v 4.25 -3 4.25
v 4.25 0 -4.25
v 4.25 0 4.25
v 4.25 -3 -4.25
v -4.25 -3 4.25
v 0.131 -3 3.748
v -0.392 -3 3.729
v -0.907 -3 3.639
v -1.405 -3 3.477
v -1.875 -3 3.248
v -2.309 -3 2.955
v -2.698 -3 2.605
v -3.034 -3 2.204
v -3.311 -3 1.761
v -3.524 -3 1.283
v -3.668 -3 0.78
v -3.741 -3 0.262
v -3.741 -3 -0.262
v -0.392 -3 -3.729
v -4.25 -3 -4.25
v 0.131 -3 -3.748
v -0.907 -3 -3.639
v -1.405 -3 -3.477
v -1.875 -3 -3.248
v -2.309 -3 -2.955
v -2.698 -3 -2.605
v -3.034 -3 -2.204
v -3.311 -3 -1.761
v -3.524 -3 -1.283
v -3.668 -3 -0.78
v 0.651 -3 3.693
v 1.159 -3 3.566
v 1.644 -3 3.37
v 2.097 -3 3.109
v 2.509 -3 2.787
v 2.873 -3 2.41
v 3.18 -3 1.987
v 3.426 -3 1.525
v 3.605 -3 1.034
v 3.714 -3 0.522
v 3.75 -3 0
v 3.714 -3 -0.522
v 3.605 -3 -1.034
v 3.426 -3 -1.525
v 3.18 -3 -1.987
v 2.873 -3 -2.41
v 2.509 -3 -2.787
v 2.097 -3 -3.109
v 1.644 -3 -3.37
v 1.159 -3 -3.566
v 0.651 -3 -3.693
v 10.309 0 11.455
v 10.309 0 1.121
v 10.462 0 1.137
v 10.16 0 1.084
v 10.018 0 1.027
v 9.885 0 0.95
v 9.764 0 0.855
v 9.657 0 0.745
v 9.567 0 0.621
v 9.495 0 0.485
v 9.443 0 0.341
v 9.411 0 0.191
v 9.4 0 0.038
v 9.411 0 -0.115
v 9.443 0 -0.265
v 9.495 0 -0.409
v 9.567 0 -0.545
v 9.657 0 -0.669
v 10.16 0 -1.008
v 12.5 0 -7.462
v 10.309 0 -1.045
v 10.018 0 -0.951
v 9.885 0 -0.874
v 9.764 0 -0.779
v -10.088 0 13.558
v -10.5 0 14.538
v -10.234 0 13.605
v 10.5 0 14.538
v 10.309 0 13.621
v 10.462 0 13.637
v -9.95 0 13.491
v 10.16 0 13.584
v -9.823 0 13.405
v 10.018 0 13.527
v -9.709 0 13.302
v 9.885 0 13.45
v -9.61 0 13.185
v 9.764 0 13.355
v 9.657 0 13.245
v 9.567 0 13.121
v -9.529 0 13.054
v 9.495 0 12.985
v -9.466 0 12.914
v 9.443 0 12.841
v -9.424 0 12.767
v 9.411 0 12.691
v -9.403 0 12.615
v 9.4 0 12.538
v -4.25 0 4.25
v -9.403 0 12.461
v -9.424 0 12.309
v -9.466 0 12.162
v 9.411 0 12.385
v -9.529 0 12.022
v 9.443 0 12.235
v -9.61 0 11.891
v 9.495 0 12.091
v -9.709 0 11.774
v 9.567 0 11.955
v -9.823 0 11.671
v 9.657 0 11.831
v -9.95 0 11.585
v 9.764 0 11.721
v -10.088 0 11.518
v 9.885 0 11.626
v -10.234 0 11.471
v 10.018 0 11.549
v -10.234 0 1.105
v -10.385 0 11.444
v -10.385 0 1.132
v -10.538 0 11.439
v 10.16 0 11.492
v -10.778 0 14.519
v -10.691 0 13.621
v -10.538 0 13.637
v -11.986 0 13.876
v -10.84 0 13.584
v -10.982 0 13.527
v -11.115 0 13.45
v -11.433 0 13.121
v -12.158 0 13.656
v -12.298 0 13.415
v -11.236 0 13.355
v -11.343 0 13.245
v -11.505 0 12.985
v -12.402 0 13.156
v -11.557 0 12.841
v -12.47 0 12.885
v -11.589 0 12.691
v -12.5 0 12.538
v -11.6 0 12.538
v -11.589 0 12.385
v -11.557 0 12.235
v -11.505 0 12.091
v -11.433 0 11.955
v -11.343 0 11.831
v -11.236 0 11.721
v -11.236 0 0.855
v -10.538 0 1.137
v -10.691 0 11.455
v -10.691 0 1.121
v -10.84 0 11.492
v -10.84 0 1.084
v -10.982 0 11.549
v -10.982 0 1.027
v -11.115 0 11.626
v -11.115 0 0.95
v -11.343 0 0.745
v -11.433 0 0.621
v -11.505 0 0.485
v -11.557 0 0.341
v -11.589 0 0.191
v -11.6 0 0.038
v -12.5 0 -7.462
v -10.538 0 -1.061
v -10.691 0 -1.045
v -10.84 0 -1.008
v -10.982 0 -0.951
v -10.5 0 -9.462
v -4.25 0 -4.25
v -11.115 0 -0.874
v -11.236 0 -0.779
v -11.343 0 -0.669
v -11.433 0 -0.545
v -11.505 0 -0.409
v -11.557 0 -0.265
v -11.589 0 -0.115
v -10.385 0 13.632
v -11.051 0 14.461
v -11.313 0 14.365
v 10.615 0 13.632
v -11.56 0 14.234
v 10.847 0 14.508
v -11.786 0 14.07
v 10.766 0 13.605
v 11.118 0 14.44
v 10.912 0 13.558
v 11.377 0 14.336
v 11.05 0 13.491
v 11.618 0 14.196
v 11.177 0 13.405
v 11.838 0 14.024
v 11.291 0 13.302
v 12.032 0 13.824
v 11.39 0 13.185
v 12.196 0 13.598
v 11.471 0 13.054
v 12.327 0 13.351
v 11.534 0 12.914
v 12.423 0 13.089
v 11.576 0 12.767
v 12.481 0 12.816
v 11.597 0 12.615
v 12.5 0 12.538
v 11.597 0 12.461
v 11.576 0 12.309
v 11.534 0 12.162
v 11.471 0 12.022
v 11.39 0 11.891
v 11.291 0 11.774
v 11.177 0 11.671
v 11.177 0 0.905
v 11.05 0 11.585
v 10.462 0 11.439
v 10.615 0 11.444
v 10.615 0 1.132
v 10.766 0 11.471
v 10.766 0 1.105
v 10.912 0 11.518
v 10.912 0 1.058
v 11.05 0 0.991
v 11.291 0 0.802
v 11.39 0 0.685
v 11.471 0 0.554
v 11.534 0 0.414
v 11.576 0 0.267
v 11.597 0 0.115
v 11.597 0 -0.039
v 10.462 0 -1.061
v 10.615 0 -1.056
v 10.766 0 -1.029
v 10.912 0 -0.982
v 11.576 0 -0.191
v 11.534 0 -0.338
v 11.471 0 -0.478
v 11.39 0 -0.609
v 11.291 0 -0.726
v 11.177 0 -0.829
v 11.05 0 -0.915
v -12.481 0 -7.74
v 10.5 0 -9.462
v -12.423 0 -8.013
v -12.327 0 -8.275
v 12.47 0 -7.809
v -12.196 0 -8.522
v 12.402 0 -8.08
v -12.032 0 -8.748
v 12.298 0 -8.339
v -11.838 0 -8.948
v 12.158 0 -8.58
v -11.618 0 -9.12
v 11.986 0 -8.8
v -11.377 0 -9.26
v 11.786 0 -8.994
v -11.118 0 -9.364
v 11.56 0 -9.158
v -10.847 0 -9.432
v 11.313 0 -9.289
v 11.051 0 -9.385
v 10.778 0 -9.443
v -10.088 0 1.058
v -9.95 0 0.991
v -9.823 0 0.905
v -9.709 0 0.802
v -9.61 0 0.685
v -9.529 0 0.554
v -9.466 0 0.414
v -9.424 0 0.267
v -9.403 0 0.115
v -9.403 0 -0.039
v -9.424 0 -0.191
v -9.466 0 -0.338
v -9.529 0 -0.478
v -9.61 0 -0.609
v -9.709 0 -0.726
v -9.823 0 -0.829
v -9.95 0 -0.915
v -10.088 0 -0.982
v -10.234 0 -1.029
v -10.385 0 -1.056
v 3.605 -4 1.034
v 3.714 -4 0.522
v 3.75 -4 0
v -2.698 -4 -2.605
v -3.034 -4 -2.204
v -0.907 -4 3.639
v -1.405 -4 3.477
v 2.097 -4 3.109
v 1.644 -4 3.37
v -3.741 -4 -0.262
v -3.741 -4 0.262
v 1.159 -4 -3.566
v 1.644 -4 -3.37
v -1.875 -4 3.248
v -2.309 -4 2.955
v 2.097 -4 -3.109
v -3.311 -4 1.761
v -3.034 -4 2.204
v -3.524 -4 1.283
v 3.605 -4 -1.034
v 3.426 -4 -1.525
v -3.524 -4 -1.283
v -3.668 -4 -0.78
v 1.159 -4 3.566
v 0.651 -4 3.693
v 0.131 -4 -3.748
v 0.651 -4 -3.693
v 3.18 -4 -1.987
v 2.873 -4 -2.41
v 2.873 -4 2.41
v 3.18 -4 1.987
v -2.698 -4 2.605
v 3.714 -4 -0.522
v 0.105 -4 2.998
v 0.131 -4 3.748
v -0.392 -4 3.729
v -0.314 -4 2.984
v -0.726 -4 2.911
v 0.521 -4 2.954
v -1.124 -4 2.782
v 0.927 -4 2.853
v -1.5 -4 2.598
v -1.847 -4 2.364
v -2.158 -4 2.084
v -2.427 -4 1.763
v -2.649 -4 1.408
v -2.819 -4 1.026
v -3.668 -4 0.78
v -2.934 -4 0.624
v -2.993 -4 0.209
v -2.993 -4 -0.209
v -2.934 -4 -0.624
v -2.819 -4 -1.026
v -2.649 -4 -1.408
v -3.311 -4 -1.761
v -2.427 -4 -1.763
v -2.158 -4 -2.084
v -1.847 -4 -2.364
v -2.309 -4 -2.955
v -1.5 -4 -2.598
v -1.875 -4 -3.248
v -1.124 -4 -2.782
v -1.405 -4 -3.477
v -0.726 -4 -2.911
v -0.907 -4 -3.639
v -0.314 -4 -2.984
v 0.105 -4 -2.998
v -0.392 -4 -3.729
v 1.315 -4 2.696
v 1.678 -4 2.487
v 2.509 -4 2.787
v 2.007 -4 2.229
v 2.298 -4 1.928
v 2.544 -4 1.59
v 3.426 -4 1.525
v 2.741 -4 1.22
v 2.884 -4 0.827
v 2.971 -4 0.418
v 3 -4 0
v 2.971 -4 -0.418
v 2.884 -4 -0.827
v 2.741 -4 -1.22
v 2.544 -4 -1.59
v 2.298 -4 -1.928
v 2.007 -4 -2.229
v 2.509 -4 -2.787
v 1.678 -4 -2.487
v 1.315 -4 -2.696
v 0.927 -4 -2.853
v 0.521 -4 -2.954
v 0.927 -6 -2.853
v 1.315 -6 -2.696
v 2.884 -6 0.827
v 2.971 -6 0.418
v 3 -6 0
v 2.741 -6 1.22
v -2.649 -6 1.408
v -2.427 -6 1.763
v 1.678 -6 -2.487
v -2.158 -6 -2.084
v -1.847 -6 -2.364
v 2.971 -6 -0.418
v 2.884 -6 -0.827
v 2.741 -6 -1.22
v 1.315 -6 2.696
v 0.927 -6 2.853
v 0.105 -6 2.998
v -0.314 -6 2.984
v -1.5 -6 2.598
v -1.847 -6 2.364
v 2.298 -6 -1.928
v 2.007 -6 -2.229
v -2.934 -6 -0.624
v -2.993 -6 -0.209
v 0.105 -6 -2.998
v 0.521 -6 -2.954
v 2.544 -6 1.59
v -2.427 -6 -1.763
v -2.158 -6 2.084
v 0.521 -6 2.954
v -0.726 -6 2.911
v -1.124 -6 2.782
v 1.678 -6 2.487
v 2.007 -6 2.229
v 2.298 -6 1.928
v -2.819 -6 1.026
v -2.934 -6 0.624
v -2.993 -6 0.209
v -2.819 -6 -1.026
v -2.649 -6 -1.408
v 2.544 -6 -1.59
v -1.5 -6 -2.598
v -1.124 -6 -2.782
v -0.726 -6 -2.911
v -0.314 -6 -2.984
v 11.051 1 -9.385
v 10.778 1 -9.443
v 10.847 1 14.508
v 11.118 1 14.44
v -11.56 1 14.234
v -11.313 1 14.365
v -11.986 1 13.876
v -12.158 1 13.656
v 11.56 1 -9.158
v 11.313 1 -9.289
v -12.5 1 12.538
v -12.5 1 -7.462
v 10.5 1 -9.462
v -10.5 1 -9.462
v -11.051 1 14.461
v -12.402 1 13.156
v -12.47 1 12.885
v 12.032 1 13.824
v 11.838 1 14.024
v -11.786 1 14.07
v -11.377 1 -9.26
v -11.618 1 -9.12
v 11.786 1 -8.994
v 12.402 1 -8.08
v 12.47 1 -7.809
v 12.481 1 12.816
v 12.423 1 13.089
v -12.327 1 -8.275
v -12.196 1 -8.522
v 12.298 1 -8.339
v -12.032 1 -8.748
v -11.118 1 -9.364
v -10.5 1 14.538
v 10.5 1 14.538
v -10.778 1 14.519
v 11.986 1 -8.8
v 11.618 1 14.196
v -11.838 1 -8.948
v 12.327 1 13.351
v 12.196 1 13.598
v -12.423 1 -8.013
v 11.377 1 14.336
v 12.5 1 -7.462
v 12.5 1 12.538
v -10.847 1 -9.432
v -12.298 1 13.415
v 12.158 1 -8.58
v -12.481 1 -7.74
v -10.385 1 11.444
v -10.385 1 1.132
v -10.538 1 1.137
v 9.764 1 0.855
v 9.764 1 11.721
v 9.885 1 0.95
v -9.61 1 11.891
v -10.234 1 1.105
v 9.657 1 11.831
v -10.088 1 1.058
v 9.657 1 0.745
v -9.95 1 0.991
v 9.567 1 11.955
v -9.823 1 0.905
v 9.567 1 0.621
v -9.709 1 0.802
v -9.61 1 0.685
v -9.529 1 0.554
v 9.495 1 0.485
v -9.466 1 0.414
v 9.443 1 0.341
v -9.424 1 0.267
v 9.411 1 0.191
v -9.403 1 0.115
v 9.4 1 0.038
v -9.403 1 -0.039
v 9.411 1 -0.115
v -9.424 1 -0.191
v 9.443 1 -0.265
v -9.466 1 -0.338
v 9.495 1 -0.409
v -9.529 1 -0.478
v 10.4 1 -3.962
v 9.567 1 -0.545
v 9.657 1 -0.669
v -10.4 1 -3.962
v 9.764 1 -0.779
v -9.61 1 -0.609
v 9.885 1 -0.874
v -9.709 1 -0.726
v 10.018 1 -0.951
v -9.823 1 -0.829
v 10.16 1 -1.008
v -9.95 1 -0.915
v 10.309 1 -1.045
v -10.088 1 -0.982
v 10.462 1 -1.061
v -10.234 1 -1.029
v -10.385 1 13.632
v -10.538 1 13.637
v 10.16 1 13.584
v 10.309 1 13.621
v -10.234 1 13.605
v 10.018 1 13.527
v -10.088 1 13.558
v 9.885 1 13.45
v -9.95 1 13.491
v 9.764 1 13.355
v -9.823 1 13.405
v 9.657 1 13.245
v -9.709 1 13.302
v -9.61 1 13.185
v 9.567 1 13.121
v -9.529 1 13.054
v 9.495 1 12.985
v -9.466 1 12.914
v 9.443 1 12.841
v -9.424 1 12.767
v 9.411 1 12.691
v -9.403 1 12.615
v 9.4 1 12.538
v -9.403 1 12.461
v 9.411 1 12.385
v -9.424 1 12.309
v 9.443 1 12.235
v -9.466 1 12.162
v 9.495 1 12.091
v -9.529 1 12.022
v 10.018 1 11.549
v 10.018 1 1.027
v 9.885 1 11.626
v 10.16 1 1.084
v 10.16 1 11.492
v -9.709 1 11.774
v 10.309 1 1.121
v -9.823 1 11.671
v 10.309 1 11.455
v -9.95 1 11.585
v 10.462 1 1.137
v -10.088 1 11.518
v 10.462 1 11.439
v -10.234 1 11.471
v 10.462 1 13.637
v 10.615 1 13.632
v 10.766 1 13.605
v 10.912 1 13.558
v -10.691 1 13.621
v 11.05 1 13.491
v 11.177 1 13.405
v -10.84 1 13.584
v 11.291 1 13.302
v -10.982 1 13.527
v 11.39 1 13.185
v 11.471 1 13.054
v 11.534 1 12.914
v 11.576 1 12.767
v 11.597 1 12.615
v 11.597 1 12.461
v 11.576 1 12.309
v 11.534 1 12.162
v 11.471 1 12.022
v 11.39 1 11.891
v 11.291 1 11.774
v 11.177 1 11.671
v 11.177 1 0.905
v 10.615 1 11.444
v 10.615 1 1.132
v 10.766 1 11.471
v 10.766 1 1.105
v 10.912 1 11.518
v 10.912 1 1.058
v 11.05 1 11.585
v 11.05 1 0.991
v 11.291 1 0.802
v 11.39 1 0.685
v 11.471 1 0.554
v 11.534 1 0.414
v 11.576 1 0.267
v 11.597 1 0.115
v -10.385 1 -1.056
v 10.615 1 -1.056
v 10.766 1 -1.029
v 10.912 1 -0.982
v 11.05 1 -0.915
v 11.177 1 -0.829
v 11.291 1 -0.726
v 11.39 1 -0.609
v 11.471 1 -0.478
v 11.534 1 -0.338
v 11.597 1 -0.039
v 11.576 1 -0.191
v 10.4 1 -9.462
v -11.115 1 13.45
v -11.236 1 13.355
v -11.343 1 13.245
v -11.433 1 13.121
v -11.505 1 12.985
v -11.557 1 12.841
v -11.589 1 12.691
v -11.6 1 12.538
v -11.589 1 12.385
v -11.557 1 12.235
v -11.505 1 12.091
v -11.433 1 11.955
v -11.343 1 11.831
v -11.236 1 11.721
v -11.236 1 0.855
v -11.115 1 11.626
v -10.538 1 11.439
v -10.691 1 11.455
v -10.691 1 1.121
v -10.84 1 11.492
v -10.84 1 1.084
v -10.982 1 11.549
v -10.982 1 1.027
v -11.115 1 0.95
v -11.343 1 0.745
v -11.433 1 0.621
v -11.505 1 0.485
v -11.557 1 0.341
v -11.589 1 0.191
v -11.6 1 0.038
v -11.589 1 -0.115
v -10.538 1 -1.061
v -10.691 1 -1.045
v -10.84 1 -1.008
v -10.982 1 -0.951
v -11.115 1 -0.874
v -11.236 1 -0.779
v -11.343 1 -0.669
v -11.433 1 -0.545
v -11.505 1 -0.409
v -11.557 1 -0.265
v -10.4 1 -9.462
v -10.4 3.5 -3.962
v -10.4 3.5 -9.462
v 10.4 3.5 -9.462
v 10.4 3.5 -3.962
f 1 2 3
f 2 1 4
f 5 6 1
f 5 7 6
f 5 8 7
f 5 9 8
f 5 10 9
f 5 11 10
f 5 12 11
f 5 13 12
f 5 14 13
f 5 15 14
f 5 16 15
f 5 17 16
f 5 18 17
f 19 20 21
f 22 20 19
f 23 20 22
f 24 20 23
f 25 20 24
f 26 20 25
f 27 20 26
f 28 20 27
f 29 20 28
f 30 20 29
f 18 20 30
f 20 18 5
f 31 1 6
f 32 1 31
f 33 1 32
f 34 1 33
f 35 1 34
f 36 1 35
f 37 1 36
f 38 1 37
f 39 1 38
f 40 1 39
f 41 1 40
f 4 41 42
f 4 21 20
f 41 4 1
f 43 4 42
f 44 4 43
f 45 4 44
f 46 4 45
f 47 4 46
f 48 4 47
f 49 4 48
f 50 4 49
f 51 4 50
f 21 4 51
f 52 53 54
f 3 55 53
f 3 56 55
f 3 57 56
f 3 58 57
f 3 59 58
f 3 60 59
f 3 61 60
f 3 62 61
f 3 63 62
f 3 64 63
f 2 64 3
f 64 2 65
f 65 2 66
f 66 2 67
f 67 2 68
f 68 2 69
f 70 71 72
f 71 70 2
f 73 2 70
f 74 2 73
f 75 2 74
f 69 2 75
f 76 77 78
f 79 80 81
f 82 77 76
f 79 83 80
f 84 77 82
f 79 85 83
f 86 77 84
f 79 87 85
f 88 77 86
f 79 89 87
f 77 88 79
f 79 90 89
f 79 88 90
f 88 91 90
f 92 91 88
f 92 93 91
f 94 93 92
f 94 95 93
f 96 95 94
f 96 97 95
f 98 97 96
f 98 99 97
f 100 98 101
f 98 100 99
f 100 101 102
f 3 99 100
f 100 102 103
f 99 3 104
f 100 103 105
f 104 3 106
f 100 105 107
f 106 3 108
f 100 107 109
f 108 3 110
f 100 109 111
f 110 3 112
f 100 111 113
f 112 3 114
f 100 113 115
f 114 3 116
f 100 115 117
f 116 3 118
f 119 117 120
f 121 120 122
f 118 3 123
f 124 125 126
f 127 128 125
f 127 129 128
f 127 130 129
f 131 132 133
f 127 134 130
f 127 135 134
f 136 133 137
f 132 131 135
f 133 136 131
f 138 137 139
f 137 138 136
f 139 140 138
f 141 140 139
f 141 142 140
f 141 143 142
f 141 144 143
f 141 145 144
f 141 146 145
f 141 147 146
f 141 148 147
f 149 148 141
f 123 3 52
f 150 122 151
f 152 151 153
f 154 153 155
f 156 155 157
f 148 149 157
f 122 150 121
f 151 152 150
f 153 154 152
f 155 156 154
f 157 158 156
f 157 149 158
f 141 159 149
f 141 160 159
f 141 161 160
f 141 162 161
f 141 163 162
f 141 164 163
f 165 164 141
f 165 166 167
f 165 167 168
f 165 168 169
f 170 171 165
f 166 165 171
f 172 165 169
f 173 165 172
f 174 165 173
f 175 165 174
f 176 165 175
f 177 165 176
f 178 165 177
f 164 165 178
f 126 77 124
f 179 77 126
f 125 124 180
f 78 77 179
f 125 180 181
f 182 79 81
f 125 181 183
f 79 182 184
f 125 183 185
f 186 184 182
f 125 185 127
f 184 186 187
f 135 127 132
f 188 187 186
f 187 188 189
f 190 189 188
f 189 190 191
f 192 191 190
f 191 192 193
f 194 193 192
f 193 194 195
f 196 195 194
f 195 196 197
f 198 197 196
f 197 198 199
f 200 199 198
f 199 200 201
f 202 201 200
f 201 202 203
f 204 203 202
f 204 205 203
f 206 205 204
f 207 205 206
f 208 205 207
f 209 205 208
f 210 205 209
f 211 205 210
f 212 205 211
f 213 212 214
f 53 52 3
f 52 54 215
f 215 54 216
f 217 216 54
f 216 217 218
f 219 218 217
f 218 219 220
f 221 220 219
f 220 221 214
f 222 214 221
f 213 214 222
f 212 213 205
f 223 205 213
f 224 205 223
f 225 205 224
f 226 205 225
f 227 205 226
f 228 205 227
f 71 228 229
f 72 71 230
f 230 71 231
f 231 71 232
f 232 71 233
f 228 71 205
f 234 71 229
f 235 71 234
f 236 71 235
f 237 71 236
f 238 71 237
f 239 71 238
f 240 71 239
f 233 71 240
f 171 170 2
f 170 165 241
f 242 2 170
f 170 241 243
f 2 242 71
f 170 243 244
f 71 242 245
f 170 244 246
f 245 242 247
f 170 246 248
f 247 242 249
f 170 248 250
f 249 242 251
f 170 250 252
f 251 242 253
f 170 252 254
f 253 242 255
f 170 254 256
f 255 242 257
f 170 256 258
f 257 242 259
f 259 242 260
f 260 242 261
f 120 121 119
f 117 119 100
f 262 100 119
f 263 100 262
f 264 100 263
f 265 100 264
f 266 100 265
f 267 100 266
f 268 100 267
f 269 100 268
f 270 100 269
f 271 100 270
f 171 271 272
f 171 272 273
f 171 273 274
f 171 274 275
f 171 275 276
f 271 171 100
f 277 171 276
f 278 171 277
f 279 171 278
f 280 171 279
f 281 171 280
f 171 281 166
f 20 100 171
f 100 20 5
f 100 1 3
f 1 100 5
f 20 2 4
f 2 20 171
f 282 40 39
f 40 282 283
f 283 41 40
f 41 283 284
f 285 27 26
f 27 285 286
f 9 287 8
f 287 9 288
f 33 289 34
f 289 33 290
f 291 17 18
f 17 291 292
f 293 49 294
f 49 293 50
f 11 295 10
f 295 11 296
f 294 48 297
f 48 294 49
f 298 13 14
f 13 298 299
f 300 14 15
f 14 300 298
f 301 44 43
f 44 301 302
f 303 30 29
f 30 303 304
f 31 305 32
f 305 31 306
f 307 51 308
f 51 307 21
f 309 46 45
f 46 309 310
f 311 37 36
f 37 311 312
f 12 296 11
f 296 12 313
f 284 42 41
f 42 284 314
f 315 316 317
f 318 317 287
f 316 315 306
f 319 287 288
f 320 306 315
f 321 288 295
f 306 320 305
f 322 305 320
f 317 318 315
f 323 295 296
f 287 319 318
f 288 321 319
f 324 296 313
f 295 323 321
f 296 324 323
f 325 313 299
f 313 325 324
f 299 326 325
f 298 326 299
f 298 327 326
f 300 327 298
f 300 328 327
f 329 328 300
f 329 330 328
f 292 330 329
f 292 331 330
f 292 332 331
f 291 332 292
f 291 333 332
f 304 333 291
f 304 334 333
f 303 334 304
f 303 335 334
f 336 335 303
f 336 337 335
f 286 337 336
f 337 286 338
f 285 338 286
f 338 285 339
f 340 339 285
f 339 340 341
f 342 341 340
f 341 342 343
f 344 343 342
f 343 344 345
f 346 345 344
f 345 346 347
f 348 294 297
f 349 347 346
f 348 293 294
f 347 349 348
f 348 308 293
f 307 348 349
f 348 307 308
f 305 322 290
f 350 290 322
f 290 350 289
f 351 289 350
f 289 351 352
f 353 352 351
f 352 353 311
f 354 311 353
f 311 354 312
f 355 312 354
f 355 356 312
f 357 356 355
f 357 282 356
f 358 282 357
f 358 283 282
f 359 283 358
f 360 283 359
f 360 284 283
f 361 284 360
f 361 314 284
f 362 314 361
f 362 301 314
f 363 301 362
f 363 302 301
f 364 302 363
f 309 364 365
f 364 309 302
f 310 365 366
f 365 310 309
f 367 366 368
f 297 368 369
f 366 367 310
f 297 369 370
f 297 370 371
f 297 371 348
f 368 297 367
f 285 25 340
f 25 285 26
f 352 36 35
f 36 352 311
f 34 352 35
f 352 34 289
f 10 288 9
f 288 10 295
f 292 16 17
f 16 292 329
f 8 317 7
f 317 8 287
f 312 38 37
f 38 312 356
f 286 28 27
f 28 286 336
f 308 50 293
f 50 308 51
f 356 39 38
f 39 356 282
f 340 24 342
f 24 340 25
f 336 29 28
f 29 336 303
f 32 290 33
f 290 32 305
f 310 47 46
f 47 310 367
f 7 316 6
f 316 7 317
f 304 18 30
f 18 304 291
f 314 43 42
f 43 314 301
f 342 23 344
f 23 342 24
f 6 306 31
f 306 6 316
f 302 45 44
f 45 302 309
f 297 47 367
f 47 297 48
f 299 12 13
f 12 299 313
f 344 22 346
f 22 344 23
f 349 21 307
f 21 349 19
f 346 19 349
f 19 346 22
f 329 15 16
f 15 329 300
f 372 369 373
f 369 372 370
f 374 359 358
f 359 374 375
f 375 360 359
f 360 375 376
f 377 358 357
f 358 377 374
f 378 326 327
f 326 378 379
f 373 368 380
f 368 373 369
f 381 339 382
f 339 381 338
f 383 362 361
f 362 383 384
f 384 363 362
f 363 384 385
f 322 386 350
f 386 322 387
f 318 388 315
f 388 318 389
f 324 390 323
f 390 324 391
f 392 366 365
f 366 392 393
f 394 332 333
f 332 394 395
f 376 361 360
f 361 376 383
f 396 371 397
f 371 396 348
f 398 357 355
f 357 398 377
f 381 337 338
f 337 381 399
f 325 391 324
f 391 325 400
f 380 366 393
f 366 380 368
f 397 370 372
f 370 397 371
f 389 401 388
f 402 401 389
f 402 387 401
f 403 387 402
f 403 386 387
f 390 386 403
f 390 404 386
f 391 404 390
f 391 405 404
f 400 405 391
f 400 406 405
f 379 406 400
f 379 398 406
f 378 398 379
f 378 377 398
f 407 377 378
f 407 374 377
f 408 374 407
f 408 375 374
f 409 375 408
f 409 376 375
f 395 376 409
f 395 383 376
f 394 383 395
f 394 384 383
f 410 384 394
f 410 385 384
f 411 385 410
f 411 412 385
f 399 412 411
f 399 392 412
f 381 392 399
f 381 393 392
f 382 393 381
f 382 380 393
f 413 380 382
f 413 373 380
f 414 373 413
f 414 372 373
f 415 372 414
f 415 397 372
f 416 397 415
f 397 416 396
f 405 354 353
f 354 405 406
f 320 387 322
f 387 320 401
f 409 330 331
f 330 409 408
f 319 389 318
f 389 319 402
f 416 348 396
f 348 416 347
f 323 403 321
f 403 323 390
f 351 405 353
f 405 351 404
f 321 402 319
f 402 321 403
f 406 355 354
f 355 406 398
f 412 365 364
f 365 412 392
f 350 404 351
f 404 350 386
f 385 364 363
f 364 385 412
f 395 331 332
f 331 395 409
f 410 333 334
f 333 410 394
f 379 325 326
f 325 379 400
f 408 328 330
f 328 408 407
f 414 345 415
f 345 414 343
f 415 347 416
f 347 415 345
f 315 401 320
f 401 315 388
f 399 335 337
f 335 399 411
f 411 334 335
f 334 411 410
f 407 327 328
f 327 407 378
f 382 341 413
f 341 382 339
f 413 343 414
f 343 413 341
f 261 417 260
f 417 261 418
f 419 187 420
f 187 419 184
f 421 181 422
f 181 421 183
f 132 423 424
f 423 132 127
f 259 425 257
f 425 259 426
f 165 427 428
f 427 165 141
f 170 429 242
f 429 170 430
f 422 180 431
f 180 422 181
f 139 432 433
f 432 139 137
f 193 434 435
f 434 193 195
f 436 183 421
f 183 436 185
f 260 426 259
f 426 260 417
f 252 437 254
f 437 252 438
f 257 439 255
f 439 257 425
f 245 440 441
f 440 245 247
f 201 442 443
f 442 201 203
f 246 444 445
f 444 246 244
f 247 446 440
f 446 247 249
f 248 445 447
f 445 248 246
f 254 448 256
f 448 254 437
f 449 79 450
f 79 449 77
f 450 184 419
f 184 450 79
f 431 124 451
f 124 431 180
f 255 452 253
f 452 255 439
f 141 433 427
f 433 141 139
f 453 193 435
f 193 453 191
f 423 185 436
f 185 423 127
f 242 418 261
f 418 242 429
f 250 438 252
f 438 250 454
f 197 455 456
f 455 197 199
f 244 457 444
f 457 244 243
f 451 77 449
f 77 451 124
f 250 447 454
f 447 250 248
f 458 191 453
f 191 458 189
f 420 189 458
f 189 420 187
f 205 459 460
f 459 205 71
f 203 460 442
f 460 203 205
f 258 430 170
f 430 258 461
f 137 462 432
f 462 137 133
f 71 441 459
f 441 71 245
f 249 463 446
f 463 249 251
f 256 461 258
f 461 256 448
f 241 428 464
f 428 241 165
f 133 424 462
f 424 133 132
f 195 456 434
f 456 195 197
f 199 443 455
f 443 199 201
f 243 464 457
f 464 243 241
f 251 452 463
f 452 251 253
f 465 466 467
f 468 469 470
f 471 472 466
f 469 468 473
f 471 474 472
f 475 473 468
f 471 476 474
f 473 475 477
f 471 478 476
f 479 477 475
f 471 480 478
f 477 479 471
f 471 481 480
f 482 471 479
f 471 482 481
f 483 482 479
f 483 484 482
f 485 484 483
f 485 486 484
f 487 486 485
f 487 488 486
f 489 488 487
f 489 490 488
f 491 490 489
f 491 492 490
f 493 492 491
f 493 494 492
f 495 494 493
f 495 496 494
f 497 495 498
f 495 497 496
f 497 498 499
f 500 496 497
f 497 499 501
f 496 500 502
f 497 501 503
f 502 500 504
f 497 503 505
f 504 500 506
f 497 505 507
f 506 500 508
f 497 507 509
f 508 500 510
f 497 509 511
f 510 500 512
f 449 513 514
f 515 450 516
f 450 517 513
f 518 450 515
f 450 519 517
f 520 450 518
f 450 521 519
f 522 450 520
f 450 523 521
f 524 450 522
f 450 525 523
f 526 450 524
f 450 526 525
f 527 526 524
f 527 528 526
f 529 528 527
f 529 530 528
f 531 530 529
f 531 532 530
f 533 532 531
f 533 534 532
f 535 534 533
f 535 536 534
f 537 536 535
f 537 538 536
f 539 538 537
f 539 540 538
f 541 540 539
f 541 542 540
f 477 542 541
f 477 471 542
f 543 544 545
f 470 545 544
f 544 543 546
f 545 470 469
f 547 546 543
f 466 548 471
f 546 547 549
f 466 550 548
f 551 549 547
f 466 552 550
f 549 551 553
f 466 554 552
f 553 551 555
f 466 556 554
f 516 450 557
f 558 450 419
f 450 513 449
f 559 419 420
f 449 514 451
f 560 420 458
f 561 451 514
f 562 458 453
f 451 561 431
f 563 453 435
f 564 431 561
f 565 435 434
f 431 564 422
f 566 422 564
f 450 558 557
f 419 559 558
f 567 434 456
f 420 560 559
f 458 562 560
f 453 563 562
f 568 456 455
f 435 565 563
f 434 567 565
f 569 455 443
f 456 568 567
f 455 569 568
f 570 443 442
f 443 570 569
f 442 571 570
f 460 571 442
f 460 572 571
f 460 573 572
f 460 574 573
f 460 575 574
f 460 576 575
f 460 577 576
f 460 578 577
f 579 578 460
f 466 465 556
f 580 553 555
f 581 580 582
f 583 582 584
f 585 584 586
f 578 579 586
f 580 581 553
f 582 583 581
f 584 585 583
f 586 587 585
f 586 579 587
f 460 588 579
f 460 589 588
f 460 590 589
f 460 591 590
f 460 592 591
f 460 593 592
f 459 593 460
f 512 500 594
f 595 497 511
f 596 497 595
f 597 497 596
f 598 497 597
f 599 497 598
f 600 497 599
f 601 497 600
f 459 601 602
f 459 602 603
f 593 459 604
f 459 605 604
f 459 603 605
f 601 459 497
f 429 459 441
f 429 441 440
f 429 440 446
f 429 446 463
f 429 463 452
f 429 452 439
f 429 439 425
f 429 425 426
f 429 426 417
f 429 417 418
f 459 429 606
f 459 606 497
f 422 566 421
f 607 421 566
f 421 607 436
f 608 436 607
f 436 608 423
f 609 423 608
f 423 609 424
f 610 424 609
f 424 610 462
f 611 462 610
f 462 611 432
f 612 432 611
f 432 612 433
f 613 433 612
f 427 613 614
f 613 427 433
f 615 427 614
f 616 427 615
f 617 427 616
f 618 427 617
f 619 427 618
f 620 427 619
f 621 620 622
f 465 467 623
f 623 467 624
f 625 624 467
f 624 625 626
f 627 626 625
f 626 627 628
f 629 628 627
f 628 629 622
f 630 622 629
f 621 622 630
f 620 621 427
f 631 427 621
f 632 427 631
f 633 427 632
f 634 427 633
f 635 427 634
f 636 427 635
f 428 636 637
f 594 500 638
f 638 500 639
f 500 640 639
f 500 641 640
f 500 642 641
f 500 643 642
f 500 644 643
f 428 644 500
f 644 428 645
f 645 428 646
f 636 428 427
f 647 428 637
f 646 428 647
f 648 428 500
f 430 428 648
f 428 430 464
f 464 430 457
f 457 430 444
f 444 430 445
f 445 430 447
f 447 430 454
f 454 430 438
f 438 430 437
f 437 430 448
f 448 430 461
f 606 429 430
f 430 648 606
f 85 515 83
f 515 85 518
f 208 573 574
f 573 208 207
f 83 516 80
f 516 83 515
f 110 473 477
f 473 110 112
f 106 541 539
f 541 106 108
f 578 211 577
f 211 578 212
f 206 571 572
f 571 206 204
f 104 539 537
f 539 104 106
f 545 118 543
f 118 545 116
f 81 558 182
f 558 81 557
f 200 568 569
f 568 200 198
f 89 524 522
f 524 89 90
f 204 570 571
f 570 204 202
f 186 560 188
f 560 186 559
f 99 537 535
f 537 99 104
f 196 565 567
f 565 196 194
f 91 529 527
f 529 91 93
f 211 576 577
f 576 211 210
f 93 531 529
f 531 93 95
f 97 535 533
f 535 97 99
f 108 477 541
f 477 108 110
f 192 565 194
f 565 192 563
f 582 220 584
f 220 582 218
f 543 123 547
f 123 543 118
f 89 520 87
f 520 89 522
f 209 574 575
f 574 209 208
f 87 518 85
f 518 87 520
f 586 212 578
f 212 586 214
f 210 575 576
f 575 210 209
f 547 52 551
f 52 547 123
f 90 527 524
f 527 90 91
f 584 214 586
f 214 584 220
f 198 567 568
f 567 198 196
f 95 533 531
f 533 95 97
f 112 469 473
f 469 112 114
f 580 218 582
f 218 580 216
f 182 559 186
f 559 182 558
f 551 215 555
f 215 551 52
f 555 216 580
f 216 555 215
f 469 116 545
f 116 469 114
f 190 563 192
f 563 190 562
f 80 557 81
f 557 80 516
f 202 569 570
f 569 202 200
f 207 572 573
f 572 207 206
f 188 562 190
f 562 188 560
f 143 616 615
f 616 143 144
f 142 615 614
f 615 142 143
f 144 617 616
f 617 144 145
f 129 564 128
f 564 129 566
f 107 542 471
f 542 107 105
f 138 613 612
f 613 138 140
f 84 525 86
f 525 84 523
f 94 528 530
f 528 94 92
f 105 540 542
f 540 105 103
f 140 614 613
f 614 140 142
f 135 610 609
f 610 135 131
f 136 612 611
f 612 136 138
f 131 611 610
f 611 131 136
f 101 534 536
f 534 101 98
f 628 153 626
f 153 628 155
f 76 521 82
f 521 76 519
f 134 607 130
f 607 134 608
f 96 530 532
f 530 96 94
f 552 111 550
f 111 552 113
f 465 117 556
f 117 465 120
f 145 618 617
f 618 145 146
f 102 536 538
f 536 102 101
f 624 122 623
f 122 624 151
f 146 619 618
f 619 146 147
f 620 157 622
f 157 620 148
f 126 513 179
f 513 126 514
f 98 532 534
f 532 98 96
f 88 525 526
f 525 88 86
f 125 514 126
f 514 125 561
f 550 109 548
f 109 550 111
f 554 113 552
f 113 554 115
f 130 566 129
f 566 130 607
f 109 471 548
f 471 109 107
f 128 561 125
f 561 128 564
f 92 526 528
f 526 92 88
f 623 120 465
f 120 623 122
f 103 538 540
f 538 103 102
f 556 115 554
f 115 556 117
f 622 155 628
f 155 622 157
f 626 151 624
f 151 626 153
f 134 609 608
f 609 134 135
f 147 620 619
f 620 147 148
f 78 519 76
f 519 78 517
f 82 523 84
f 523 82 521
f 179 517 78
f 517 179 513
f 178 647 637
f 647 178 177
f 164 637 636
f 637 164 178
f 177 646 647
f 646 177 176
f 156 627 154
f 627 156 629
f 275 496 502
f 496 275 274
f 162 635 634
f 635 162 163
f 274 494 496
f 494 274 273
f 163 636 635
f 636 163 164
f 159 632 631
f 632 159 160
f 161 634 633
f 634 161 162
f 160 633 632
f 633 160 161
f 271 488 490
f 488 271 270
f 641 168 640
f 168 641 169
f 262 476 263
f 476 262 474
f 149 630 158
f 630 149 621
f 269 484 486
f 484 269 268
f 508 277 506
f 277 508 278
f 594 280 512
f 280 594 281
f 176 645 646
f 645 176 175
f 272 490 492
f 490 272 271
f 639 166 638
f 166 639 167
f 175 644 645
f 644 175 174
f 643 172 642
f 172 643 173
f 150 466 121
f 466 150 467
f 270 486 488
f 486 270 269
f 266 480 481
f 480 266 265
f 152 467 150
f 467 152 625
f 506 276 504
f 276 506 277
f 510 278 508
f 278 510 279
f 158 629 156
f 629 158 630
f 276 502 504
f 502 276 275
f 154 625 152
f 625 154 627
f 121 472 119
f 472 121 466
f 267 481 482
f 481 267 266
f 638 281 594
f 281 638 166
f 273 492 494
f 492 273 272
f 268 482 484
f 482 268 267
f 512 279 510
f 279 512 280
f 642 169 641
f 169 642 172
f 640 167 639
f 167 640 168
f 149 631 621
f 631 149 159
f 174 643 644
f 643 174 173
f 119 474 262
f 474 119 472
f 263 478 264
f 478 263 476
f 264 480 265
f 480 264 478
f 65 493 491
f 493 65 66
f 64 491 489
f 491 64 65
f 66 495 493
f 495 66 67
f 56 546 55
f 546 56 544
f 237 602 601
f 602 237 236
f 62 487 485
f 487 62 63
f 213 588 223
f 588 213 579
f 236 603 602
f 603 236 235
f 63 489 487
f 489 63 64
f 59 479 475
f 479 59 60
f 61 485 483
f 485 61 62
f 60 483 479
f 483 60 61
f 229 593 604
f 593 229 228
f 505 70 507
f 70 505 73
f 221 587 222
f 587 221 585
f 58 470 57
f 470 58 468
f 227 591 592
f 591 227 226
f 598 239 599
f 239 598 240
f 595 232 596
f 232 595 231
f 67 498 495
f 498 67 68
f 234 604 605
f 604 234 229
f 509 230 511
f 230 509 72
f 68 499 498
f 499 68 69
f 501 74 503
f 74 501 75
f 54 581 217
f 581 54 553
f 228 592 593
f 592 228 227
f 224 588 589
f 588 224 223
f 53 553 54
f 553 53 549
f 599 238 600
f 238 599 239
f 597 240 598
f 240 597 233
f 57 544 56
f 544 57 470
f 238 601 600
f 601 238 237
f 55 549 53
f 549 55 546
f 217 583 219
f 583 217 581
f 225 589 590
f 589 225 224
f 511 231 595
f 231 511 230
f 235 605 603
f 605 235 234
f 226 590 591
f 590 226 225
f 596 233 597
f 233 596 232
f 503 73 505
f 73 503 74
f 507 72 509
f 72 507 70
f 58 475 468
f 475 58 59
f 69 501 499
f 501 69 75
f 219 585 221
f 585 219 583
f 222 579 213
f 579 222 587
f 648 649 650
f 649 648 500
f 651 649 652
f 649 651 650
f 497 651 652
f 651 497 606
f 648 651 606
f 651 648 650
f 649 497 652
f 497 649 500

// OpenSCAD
// file: variables.scad
// Name: Raspberry Pi Camera v2.1 Variables
// Description: Variables used by the camera model
// Created: 1 Sep 2021
// Author: Krisjanis Rijnieks

// Dimensions taken from
// https://www.raspberrypi-spy.co.uk/2013/05/pi-camera-module-mechanical-dimensions/
// https://www.raspberrypi.org/documentation/accessories/camera.html

rpiCameraPCBWidth = 25;
rpiCameraPCBHeight = 24;
rpiCameraPCBThickness = 1;
rpiCameraPCBCornerRadius = 2;

rpiCameraHoleDiameter = 2.2;
rpiCameraHolePadding = 2;
rpiCameraHoleDistance = 12.5; // Vertical distance between holes aligned with the cam and the ones on the edge

rpiCameraSensorBaseSize = 8.5;
rpiCameraSensorBaseHeight = 3;
rpiCameraSensorRingSize = 7.5;
rpiCameraSensorRingHeight = 1;
rpiCameraSensorLensSize = 6;
rpiCameraSensorLensHeight = 2; // this is split in half if we want more detail
rpiCameraSensorCenterToTopEdge = 9.462;

rpiCameraConnectorWidth = 20.8;
rpiCameraConnectorThickness = 2.5;
rpiCameraConnectorHeight = 5.5;
rpiCameraCableWidth = 16;


rpiCameraFullThickness = 9;
// main file
// Name: Raspberry Pi Camera v2.1
// Description: A model to be integrated in other models
// Created: 1 Sep 2021
// Author: Krisjanis Rijnieks

include <variables.scad>

RpiCameraSensor(
  baseSize = rpiCameraSensorBaseSize, 
  baseHeight = rpiCameraSensorBaseHeight,
  ringSize = rpiCameraSensorRingSize,
  ringHeight = rpiCameraSensorRingHeight, 
  lensSize = rpiCameraSensorLensSize,
  lensHeight = rpiCameraSensorLensHeight);

RpiCameraPCB(
  width = rpiCameraPCBWidth,
  height = rpiCameraPCBHeight,
  thickness = rpiCameraPCBThickness, 
  cornerRadius = rpiCameraPCBCornerRadius,
  holeDiameter = rpiCameraHoleDiameter,
  holePadding = rpiCameraHolePadding,
  holeDistance = rpiCameraHoleDistance,
  sensorToTopEdge = rpiCameraSensorCenterToTopEdge);

rotate([90, 180, 0])
translate([0, 
  rpiCameraSensorCenterToTopEdge, 
  -rpiCameraPCBThickness])
RpiCameraConnector(
  width = rpiCameraConnectorWidth,
  height = rpiCameraConnectorHeight,
  thickness = rpiCameraConnectorThickness);

module RpiCameraConnector(
  width, thickness, height,
  pcbThickness, ){
  mirror([0, 0, 1])
  translate([-width/2, -height, 0])
  cube(size = [width, height, thickness]);
}

module RpiCameraPCB(
  width, height, thickness, cornerRadius, 
  holeDiameter, holePadding, holeDistance,
  sensorToTopEdge){
  
  // rotate so that shorter gap beten edge and sensor is at the bottom
  rotate([90, 180, 0]){
    translate([
      -width / 2, 
      -height + sensorToTopEdge, 0])
    mirror([0, 0, 1])
    difference(){
      linear_extrude(height = thickness){
        offset(r = cornerRadius, $fn = 45){
          offset(r = -cornerRadius){
            square(size = [width, height]);
          }
        }
      }
      
      translate([
        holePadding, 
        holePadding, 
        thickness / 2])
      cylinder(
        d = holeDiameter, h = thickness * 2, 
        center = true, $fn = 45);
      
      translate([
        width - holePadding, 
        holePadding, 
        thickness / 2])
      cylinder(
        d = holeDiameter, h = thickness * 2, 
        center = true, $fn = 45);
      
      translate([
        width - holePadding, 
        holePadding + holeDistance, 
        thickness / 2])
      cylinder(
        d = holeDiameter, h = thickness * 2, 
        center = true, $fn = 45);
      
      translate([
        holePadding, 
        holePadding + holeDistance, 
        thickness / 2])
      cylinder(
        d = holeDiameter, h = thickness * 2, 
        center = true, $fn = 45);    
    }
  }
}

module RpiCameraSensor(
  baseSize, baseHeight,
  ringSize, ringHeight, 
  lensSize, lensHeight){
  
  // Rotate so that the camera is facing front
  rotate([90, 0, 0]){
    translate([0, 0, baseHeight/2])
    cube(
      size = [baseSize, baseSize, baseHeight], 
      center = true);
      
    translate([0, 0, baseHeight])
    cylinder(d = ringSize, h = ringHeight, $fn = 45);
      
    translate([0, 0, baseHeight + ringHeight])
    cylinder(d = lensSize, h = lensHeight, $fn = 45);
  }
}
